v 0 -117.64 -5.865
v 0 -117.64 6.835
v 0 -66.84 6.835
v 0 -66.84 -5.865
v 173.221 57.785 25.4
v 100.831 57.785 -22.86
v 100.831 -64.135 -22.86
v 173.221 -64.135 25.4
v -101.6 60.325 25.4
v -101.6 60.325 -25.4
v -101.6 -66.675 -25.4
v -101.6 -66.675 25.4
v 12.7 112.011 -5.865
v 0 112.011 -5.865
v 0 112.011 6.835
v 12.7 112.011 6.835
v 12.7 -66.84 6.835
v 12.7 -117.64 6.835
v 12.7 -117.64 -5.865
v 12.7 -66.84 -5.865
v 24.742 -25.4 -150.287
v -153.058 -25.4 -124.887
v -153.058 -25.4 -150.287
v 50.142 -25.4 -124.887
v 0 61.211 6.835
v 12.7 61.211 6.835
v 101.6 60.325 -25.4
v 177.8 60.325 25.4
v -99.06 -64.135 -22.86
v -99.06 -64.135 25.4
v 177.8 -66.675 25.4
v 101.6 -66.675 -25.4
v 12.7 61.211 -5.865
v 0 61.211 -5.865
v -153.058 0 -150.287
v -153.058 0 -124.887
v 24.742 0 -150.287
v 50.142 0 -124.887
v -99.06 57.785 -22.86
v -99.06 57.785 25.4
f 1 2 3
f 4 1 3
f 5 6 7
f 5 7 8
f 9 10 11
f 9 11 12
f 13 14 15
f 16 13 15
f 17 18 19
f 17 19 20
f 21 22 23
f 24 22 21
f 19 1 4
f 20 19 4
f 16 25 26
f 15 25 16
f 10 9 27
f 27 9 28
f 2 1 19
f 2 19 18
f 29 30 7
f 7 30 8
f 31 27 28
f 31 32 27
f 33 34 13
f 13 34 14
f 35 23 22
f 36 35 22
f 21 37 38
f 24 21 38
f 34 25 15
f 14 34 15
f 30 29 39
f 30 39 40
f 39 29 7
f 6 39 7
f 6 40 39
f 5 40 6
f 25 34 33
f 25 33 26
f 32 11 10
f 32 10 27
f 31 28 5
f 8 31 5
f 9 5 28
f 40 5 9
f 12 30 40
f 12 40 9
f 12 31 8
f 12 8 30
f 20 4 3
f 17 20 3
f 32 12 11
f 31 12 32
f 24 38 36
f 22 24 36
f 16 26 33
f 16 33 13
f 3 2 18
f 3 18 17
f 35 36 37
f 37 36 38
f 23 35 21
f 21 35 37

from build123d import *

# Parameters (mm, degrees)
F0_W     = 203.2
F0_H     = 50.8
F1_DEPTH = 3.175
F4_DEPTH = 63.5
F5_T     = -2.54
F6_W     = 50.8
F6_H     = 12.7
F7_DEPTH = 12.7
F8_W     = 177.8
F8_H     = 25.4
F9_DEPTH = 25.4


with BuildPart() as f1:
    # F0 (on Front) → F1 (new body, symmetric)
    with BuildSketch(Plane.XZ):
        Polygon((177.8, 25.4), (101.6, 25.4), (101.6, -25.4), align=None)
        Rectangle(F0_W, F0_H)
    extrude(amount=F1_DEPTH, both=True)


with BuildPart() as f2_1:
    # F2: copy of F1
    add(f1.part)


with BuildPart() as f1_1:
    add(f1.part)

    # F4 (add, symmetric): a face of the model
    f4_faces = [f1_1.faces().sort_by_distance(p)[0] for p in [
        (20.0526315789, -3.175, 1.3368421053),
    ]]
    extrude(f4_faces, amount=F4_DEPTH, both=True)

    # F5
    f5_openings = [f1_1.faces().sort_by_distance(p)[0] for p in [
        (38.1, -3.175, 25.4),
    ]]
    offset(amount=F5_T, openings=f5_openings)


with BuildPart() as f7:
    # F6 (on Right) → F7 (new body)
    with BuildSketch(Plane.YZ):
        with Locations((-92.2398825281, 0.4846053965)):
            Rectangle(F6_W, F6_H)
    extrude(amount=F7_DEPTH)


with BuildPart() as f7b:
    # F6 (on Right) → F7, piece 2 (new body)
    with BuildSketch(Plane.YZ):
        with Locations((86.6106621265, 0.4846053965)):
            Rectangle(F6_W, F6_H)
    extrude(amount=F7_DEPTH)


with BuildPart() as f9:
    # F8 (on Front) → F9 (new body)
    with BuildSketch(Plane.XZ):
        Polygon((50.1418564967, -124.886709961), (24.7418564967, -124.886709961), (24.7418564967, -150.286709961), align=None)
        with Locations((-64.1581435033, -137.586709961)):
            Rectangle(F8_W, F8_H)
    extrude(amount=F9_DEPTH)


solid = Compound([f1_1.part, f7.part, f7b.part, f9.part])
